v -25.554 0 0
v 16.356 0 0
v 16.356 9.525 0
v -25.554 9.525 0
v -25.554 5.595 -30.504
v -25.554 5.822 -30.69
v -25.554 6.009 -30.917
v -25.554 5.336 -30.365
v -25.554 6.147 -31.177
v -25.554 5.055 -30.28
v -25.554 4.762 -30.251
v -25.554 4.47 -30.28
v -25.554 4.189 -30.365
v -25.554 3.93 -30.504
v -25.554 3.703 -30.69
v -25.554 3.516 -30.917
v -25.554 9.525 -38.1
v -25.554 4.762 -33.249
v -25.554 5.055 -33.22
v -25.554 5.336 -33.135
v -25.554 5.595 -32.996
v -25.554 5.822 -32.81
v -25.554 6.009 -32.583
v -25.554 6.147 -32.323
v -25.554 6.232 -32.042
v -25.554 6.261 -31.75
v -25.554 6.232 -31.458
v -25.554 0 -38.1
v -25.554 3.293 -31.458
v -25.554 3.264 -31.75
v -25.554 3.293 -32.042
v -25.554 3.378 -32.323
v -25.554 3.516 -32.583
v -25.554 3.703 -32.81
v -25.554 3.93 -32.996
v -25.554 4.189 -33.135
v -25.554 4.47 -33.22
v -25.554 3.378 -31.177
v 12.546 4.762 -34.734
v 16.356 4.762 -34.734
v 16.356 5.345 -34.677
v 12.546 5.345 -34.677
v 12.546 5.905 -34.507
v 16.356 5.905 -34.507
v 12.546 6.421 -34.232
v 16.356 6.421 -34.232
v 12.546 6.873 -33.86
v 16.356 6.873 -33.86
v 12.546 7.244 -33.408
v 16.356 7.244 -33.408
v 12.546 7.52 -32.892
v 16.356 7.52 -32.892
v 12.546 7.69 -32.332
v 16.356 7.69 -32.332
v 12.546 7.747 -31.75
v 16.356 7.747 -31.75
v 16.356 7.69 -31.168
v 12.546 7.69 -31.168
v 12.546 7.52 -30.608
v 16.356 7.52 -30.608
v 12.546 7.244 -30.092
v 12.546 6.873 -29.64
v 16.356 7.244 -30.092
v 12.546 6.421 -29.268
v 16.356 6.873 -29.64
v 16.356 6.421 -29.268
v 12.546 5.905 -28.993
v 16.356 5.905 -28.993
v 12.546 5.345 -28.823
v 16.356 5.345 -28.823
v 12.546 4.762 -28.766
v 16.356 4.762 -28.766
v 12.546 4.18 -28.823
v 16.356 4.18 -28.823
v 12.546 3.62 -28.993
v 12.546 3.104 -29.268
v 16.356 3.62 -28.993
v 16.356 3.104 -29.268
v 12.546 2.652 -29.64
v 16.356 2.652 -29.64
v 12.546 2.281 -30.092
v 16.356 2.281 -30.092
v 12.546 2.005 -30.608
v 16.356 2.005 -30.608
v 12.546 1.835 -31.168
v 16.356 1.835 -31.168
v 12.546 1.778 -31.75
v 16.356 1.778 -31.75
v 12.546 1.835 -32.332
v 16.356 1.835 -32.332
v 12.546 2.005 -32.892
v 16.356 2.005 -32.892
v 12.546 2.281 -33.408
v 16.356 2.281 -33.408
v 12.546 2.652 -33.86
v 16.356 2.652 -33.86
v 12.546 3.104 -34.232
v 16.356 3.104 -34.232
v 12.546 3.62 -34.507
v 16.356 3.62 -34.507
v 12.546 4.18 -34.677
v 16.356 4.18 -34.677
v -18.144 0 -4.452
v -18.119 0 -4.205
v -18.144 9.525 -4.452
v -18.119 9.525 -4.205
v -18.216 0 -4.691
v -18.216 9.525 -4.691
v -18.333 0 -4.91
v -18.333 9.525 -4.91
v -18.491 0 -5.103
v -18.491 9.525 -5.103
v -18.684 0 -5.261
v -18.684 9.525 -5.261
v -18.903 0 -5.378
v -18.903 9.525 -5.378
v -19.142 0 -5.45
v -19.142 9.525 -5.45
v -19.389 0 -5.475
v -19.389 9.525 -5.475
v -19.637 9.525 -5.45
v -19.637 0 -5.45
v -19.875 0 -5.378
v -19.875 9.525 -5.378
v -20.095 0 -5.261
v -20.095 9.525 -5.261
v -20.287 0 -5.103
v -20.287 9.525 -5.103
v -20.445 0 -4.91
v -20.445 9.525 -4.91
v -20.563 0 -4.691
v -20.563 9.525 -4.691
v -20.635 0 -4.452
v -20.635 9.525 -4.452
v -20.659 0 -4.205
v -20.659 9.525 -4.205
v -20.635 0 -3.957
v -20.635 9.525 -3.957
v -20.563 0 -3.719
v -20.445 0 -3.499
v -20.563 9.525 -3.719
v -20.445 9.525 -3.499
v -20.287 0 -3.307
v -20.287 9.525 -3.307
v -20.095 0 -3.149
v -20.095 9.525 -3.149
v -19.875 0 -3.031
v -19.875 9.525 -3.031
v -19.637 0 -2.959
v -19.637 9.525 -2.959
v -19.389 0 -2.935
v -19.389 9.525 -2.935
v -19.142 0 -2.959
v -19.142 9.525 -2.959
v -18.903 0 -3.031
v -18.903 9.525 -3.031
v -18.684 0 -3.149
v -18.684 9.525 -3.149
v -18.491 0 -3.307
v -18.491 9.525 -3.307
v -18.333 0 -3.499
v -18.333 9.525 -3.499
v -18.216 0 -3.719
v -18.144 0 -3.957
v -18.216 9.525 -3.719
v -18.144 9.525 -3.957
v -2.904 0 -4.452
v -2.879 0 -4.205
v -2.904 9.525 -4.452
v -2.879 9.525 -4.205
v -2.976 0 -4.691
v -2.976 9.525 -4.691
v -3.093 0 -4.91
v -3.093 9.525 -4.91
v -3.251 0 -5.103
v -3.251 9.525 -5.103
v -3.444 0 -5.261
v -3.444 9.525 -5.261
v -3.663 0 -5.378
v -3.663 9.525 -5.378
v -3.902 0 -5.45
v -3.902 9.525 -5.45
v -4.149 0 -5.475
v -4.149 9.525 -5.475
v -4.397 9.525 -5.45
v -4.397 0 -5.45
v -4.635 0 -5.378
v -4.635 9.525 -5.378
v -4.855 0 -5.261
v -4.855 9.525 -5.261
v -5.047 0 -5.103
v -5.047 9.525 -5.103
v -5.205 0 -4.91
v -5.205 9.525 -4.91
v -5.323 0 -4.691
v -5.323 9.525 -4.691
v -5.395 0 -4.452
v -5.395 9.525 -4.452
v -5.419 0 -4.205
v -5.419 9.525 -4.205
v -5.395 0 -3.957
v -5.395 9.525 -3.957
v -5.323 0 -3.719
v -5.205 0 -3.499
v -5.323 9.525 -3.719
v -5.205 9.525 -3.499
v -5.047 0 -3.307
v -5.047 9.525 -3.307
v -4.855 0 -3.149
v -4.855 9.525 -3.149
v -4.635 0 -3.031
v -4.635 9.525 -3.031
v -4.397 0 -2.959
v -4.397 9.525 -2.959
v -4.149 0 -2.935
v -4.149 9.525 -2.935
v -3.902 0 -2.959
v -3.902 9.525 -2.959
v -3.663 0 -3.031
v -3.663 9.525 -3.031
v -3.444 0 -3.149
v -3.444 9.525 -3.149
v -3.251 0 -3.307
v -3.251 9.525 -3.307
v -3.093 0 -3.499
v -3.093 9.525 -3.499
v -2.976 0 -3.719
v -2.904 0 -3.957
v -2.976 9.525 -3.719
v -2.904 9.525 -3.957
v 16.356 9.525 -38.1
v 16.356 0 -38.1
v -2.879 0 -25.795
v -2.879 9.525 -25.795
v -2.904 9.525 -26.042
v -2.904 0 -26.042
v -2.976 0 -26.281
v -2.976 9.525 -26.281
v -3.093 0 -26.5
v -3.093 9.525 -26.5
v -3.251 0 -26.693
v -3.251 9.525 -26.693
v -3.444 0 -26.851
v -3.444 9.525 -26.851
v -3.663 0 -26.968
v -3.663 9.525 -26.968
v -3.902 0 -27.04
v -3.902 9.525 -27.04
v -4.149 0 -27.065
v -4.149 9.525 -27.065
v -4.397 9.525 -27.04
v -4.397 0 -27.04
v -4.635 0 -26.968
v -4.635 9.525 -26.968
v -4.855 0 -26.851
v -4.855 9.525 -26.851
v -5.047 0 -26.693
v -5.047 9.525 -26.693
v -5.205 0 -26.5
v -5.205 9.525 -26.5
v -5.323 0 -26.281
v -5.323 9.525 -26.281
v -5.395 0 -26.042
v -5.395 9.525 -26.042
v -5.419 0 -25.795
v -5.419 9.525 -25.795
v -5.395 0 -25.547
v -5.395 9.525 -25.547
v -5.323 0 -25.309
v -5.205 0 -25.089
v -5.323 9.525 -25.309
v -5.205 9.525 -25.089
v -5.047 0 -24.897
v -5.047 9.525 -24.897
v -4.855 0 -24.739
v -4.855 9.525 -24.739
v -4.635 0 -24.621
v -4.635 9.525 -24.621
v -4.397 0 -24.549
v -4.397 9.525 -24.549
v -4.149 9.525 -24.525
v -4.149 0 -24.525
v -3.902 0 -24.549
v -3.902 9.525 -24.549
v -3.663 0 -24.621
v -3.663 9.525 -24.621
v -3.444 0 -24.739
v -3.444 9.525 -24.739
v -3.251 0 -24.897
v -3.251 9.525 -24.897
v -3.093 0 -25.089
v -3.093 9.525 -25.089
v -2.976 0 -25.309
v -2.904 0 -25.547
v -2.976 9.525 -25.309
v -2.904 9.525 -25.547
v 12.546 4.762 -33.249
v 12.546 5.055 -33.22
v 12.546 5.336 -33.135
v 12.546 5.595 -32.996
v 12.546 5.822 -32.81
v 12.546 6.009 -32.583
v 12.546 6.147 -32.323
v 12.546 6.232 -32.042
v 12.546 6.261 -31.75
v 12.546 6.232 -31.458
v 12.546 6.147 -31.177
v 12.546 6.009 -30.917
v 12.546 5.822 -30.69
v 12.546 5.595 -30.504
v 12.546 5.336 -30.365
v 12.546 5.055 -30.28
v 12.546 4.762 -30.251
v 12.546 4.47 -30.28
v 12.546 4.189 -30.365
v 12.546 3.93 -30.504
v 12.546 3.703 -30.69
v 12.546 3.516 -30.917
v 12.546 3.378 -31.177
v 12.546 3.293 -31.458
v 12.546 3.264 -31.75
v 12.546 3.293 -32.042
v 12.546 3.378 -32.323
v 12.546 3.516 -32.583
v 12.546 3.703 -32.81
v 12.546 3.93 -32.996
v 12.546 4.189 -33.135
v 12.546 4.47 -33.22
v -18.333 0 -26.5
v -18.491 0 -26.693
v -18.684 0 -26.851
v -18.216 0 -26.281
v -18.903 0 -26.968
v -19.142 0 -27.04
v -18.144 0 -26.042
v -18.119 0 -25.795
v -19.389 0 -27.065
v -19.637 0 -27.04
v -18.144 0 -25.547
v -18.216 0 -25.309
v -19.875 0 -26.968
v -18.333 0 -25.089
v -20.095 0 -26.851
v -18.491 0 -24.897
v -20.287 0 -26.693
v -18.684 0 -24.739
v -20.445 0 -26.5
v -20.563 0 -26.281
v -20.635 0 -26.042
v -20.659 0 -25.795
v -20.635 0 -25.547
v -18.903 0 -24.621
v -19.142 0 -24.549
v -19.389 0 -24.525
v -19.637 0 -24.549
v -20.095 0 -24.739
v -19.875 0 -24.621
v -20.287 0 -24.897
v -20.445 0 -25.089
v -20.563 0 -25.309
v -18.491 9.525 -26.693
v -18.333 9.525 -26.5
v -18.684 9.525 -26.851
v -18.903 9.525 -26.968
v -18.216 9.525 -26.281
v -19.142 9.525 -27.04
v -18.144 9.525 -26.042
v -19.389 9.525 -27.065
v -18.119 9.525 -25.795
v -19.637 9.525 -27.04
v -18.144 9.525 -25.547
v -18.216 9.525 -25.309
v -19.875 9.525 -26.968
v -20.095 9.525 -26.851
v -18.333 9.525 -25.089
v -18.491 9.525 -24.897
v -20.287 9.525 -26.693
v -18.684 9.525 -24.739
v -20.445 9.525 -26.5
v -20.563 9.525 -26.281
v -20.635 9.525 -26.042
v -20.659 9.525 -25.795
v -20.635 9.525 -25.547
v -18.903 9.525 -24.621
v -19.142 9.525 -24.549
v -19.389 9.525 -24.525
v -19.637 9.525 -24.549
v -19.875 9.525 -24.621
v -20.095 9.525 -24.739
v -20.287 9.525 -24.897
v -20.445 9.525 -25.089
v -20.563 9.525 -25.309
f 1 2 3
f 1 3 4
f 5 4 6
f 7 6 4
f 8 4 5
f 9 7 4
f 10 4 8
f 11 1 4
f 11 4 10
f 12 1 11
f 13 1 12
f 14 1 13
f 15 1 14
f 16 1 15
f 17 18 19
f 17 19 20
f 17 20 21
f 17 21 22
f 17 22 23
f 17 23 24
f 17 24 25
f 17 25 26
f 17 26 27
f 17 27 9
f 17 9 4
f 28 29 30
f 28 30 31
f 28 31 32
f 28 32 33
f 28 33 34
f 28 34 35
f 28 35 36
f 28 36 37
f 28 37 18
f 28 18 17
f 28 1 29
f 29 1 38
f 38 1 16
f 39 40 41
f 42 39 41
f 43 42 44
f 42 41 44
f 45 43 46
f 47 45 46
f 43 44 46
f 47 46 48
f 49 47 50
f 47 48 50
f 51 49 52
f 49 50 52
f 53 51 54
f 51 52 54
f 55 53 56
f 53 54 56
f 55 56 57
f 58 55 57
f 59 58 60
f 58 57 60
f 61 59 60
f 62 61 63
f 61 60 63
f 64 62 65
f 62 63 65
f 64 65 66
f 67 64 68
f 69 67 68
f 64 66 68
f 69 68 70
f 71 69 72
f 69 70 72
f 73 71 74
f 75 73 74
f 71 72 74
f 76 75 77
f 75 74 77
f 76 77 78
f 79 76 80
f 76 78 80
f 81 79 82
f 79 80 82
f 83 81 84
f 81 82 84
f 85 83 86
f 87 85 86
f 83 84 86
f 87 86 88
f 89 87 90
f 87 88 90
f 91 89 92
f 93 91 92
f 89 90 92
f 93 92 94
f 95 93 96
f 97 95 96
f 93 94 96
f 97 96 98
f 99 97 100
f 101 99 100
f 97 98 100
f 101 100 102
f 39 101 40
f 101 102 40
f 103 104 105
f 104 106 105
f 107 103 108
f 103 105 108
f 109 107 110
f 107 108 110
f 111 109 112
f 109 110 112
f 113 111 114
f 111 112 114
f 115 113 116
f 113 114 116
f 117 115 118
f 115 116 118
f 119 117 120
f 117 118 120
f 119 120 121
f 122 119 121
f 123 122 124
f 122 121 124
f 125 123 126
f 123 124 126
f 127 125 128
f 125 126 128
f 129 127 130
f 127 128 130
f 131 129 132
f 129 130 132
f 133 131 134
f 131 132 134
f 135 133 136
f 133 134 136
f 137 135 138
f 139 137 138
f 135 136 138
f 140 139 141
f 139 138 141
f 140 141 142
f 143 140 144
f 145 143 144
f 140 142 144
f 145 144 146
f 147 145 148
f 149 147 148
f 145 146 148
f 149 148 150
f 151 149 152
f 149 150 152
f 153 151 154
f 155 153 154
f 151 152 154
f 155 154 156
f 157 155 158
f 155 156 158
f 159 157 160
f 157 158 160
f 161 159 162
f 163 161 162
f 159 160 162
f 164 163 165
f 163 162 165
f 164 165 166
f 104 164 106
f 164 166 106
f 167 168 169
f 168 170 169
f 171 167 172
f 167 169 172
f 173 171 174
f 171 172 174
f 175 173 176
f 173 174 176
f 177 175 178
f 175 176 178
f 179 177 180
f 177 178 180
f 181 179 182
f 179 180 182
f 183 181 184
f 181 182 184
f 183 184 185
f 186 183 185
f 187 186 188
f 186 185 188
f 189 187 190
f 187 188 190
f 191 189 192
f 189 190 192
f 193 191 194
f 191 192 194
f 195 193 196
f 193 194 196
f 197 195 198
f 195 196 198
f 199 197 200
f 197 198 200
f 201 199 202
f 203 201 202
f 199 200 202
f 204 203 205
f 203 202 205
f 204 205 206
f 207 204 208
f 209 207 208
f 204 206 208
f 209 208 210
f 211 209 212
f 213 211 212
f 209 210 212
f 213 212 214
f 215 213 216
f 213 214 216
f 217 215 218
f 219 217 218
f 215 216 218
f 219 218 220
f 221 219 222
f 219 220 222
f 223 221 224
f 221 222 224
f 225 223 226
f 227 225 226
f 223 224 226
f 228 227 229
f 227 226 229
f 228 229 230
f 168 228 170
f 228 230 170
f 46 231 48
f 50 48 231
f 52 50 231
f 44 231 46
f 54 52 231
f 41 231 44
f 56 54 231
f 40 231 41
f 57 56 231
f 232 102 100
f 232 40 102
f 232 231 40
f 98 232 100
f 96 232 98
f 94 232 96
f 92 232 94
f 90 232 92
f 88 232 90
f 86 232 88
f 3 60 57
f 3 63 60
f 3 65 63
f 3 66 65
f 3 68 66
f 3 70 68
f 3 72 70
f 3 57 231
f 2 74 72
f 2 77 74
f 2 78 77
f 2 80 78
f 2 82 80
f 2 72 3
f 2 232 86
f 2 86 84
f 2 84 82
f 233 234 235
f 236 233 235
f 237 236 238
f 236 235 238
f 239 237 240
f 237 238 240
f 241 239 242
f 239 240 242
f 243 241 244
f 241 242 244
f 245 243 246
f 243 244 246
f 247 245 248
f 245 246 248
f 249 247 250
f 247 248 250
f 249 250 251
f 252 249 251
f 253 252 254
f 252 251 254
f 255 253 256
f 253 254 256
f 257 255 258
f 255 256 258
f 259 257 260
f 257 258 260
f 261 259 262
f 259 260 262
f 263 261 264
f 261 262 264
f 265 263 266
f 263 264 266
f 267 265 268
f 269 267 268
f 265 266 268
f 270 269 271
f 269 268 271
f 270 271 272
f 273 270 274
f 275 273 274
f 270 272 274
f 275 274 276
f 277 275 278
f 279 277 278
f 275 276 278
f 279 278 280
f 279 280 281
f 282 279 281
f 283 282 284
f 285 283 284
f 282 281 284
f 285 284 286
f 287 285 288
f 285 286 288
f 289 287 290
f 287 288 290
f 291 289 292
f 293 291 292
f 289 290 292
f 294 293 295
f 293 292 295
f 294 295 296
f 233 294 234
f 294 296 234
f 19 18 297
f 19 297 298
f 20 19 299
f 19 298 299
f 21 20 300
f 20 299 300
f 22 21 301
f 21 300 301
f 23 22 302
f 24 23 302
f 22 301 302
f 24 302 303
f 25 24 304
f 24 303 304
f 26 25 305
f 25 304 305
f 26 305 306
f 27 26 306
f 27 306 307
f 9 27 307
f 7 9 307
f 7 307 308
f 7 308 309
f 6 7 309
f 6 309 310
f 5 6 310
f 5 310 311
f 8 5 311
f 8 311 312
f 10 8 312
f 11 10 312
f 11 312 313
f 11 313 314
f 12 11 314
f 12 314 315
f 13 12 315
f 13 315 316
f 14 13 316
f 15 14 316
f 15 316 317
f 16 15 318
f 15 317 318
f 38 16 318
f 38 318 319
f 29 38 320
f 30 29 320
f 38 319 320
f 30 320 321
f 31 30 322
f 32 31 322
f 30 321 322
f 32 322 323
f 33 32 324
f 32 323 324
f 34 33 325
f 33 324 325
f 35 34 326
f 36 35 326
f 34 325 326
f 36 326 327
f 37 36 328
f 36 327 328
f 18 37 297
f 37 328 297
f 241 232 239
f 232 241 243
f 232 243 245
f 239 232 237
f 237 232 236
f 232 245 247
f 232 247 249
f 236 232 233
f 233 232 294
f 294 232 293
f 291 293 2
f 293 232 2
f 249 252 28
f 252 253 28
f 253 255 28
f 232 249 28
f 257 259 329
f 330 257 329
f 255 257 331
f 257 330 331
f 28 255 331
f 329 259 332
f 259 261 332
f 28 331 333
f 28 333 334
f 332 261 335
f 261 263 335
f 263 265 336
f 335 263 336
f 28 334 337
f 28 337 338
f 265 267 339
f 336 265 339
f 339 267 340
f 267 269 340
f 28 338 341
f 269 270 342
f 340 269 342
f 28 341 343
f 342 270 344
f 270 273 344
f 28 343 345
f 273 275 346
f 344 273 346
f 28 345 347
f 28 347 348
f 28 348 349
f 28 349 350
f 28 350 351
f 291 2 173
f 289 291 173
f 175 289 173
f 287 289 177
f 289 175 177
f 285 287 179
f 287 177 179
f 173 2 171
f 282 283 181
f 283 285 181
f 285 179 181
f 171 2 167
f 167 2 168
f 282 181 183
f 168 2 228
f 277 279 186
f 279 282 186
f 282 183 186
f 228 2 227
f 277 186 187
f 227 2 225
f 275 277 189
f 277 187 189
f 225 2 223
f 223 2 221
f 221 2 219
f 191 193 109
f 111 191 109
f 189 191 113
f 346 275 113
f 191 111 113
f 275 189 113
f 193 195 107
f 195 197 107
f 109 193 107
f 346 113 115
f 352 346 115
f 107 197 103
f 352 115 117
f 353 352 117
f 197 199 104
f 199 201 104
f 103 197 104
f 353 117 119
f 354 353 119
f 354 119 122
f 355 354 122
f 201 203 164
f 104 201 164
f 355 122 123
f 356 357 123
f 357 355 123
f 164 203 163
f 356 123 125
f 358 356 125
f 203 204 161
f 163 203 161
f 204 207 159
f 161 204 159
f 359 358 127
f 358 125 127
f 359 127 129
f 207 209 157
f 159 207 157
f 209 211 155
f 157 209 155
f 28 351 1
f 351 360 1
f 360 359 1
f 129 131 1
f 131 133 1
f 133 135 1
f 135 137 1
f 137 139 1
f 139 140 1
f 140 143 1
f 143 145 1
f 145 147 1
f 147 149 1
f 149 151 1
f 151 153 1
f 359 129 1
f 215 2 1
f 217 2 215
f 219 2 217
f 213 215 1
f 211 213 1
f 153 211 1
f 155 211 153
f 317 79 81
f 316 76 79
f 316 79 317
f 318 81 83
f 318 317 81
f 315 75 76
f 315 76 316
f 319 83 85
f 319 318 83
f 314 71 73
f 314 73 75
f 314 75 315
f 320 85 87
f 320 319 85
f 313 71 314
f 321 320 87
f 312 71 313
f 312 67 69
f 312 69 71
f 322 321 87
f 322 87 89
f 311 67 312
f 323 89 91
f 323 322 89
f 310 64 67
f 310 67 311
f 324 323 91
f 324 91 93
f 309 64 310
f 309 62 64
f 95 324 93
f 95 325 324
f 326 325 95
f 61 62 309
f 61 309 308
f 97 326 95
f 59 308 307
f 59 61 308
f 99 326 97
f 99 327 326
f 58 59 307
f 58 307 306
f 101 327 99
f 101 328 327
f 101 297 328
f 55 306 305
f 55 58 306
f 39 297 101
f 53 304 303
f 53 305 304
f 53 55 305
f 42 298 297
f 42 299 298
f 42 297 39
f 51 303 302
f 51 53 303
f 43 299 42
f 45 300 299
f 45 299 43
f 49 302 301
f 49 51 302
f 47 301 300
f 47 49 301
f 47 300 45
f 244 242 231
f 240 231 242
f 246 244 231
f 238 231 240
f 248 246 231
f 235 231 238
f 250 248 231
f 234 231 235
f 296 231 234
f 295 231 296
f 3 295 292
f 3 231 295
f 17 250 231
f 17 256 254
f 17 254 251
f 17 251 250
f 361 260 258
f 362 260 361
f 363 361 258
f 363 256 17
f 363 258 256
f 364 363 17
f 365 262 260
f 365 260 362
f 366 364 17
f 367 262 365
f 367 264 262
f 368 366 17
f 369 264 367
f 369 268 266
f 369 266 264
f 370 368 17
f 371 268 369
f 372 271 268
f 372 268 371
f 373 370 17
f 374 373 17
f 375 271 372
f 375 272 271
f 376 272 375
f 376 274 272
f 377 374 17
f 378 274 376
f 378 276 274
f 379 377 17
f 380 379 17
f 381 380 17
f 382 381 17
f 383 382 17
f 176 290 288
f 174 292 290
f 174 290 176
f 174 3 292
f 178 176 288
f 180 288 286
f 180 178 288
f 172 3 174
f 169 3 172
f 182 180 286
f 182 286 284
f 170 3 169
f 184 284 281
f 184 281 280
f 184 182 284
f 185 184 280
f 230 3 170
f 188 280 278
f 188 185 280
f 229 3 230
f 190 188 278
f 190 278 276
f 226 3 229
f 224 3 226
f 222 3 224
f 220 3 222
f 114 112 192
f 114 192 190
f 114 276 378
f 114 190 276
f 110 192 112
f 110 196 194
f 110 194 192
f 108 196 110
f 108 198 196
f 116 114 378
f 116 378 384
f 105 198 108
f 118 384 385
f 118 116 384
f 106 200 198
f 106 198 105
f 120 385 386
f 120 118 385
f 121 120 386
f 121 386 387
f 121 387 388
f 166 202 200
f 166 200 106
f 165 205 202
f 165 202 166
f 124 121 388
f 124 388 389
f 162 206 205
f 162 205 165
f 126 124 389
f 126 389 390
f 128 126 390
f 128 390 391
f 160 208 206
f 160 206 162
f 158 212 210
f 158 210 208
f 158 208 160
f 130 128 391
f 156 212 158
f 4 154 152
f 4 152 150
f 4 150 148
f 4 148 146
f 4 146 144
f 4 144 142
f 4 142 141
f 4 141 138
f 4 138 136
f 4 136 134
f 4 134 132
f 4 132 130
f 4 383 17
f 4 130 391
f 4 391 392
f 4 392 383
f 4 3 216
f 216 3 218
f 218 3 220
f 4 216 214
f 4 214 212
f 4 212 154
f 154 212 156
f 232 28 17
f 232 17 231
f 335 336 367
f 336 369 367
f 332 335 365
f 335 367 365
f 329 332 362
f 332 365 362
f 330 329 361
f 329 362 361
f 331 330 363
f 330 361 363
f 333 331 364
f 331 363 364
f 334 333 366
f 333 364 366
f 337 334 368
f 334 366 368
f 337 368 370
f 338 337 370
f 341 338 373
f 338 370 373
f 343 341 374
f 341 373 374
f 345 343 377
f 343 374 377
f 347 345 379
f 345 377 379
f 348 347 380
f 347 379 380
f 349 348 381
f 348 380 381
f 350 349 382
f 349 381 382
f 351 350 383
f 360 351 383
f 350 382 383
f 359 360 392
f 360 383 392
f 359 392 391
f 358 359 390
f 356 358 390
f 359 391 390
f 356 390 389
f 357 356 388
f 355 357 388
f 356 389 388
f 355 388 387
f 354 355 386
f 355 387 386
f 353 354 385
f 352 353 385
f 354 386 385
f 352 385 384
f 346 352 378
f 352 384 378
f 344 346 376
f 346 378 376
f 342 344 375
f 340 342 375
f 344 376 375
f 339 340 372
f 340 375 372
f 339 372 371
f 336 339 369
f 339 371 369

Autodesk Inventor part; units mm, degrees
ref_plane "YZ Plane" through (0, 0, 0) normal (1, 0, 0) x (0, 1, 0)
ref_plane "XZ Plane" through (0, 0, 0) normal (0, 1, 0) x (-1, 0, 0)
ref_plane "XY Plane" through (0, 0, 0) normal (0, 0, 1) x (1, 0, 0)
sketch "Sketch1" plane through (0, 0, 0) normal (0, 1, 0) x (-1, 0, 0)
  line L0 (-16.3555, 0) -> (25.5545, 0)
  line L1 (25.5545, 0) -> (25.5545, -38.1)
  line L2 (25.5545, -38.1) -> (-16.3555, -38.1)
  line L3 (-16.3555, -38.1) -> (-16.3555, 0)
  point P0 (0, 0)
  dimension "d0" = 41.91
  dimension "d1" = 38.1
extrude "Extrusion1" add sketch "Sketch1" along normal blind 9.525
sketch "Sketch2" plane through (16.3555, 0, 0) normal (1, 0, 0) x (0, 0, -1)
  circle A0 centre (31.75, 4.7625) radius 1.4986
  line L0 (0, 0) -> (38.1, 0) projected
  line L1 (38.1, 0) -> (38.1, 9.525) projected
  dimension "d4" = 2.9972
  dimension "d5" = 4.7625
  dimension "d6" = 6.35
extrude "Extrusion2" cut sketch "Sketch2" against normal through all
sketch "Sketch3" plane through (16.3555, 0, 0) normal (1, 0, 0) x (0, 0, -1)
  circle A0 centre (31.75, 4.7625) radius 1.4986 projected
  circle A1 centre (31.75, 4.7625) radius 2.9845
  circle A2 centre (31.75, 4.7625) radius 1.4986
  point P0 (0, 0)
  dimension "d9" = 5.969
extrude "Extrusion3" cut sketch "Sketch3" against normal blind 3.81
sketch "Sketch4" plane through (0, 9.525, 0) normal (0, 1, 0) x (1, 0, 0)
  line L0 (-19.3894, 4.2047) -> (-4.1494, 4.2047)
  line L1 (-4.1494, 4.2047) -> (-4.1494, 25.7947)
  line L2 (-4.1494, 25.7947) -> (-19.3894, 25.7947)
  line L3 (-19.3894, 25.7947) -> (-19.3894, 4.2047)
  line L4 (16.3555, 38.1) -> (-25.5545, 38.1) projected
  line L5 (-25.5545, 38.1) -> (-25.5545, 0) projected
  circle A0 centre (-19.3894, 4.2047) radius 1.27
  circle A1 centre (-4.1494, 4.2047) radius 1.27
  circle A2 centre (-4.1494, 25.7947) radius 1.27
  circle A3 centre (-19.3894, 25.7947) radius 1.27
  point P0 (0, 0)
  point P1 (-19.3894, 14.9997)
  dimension "d12" = 21.59
  dimension "d14" = 15.24
  dimension "d16" = 2.54
  dimension "d17" = 2.54
  dimension "d20" = 2.54
extrude "Extrusion4" cut sketch "Sketch4" against normal through all contours L3 A0 L0 | L0 A0 L3 | A1 L1 L0 | L0 L1 A1 | A3 L2 L3 | L3 L2 A3 | A2 L2 L1 | L1 L2 A2
properties part number "sensor bendor"
